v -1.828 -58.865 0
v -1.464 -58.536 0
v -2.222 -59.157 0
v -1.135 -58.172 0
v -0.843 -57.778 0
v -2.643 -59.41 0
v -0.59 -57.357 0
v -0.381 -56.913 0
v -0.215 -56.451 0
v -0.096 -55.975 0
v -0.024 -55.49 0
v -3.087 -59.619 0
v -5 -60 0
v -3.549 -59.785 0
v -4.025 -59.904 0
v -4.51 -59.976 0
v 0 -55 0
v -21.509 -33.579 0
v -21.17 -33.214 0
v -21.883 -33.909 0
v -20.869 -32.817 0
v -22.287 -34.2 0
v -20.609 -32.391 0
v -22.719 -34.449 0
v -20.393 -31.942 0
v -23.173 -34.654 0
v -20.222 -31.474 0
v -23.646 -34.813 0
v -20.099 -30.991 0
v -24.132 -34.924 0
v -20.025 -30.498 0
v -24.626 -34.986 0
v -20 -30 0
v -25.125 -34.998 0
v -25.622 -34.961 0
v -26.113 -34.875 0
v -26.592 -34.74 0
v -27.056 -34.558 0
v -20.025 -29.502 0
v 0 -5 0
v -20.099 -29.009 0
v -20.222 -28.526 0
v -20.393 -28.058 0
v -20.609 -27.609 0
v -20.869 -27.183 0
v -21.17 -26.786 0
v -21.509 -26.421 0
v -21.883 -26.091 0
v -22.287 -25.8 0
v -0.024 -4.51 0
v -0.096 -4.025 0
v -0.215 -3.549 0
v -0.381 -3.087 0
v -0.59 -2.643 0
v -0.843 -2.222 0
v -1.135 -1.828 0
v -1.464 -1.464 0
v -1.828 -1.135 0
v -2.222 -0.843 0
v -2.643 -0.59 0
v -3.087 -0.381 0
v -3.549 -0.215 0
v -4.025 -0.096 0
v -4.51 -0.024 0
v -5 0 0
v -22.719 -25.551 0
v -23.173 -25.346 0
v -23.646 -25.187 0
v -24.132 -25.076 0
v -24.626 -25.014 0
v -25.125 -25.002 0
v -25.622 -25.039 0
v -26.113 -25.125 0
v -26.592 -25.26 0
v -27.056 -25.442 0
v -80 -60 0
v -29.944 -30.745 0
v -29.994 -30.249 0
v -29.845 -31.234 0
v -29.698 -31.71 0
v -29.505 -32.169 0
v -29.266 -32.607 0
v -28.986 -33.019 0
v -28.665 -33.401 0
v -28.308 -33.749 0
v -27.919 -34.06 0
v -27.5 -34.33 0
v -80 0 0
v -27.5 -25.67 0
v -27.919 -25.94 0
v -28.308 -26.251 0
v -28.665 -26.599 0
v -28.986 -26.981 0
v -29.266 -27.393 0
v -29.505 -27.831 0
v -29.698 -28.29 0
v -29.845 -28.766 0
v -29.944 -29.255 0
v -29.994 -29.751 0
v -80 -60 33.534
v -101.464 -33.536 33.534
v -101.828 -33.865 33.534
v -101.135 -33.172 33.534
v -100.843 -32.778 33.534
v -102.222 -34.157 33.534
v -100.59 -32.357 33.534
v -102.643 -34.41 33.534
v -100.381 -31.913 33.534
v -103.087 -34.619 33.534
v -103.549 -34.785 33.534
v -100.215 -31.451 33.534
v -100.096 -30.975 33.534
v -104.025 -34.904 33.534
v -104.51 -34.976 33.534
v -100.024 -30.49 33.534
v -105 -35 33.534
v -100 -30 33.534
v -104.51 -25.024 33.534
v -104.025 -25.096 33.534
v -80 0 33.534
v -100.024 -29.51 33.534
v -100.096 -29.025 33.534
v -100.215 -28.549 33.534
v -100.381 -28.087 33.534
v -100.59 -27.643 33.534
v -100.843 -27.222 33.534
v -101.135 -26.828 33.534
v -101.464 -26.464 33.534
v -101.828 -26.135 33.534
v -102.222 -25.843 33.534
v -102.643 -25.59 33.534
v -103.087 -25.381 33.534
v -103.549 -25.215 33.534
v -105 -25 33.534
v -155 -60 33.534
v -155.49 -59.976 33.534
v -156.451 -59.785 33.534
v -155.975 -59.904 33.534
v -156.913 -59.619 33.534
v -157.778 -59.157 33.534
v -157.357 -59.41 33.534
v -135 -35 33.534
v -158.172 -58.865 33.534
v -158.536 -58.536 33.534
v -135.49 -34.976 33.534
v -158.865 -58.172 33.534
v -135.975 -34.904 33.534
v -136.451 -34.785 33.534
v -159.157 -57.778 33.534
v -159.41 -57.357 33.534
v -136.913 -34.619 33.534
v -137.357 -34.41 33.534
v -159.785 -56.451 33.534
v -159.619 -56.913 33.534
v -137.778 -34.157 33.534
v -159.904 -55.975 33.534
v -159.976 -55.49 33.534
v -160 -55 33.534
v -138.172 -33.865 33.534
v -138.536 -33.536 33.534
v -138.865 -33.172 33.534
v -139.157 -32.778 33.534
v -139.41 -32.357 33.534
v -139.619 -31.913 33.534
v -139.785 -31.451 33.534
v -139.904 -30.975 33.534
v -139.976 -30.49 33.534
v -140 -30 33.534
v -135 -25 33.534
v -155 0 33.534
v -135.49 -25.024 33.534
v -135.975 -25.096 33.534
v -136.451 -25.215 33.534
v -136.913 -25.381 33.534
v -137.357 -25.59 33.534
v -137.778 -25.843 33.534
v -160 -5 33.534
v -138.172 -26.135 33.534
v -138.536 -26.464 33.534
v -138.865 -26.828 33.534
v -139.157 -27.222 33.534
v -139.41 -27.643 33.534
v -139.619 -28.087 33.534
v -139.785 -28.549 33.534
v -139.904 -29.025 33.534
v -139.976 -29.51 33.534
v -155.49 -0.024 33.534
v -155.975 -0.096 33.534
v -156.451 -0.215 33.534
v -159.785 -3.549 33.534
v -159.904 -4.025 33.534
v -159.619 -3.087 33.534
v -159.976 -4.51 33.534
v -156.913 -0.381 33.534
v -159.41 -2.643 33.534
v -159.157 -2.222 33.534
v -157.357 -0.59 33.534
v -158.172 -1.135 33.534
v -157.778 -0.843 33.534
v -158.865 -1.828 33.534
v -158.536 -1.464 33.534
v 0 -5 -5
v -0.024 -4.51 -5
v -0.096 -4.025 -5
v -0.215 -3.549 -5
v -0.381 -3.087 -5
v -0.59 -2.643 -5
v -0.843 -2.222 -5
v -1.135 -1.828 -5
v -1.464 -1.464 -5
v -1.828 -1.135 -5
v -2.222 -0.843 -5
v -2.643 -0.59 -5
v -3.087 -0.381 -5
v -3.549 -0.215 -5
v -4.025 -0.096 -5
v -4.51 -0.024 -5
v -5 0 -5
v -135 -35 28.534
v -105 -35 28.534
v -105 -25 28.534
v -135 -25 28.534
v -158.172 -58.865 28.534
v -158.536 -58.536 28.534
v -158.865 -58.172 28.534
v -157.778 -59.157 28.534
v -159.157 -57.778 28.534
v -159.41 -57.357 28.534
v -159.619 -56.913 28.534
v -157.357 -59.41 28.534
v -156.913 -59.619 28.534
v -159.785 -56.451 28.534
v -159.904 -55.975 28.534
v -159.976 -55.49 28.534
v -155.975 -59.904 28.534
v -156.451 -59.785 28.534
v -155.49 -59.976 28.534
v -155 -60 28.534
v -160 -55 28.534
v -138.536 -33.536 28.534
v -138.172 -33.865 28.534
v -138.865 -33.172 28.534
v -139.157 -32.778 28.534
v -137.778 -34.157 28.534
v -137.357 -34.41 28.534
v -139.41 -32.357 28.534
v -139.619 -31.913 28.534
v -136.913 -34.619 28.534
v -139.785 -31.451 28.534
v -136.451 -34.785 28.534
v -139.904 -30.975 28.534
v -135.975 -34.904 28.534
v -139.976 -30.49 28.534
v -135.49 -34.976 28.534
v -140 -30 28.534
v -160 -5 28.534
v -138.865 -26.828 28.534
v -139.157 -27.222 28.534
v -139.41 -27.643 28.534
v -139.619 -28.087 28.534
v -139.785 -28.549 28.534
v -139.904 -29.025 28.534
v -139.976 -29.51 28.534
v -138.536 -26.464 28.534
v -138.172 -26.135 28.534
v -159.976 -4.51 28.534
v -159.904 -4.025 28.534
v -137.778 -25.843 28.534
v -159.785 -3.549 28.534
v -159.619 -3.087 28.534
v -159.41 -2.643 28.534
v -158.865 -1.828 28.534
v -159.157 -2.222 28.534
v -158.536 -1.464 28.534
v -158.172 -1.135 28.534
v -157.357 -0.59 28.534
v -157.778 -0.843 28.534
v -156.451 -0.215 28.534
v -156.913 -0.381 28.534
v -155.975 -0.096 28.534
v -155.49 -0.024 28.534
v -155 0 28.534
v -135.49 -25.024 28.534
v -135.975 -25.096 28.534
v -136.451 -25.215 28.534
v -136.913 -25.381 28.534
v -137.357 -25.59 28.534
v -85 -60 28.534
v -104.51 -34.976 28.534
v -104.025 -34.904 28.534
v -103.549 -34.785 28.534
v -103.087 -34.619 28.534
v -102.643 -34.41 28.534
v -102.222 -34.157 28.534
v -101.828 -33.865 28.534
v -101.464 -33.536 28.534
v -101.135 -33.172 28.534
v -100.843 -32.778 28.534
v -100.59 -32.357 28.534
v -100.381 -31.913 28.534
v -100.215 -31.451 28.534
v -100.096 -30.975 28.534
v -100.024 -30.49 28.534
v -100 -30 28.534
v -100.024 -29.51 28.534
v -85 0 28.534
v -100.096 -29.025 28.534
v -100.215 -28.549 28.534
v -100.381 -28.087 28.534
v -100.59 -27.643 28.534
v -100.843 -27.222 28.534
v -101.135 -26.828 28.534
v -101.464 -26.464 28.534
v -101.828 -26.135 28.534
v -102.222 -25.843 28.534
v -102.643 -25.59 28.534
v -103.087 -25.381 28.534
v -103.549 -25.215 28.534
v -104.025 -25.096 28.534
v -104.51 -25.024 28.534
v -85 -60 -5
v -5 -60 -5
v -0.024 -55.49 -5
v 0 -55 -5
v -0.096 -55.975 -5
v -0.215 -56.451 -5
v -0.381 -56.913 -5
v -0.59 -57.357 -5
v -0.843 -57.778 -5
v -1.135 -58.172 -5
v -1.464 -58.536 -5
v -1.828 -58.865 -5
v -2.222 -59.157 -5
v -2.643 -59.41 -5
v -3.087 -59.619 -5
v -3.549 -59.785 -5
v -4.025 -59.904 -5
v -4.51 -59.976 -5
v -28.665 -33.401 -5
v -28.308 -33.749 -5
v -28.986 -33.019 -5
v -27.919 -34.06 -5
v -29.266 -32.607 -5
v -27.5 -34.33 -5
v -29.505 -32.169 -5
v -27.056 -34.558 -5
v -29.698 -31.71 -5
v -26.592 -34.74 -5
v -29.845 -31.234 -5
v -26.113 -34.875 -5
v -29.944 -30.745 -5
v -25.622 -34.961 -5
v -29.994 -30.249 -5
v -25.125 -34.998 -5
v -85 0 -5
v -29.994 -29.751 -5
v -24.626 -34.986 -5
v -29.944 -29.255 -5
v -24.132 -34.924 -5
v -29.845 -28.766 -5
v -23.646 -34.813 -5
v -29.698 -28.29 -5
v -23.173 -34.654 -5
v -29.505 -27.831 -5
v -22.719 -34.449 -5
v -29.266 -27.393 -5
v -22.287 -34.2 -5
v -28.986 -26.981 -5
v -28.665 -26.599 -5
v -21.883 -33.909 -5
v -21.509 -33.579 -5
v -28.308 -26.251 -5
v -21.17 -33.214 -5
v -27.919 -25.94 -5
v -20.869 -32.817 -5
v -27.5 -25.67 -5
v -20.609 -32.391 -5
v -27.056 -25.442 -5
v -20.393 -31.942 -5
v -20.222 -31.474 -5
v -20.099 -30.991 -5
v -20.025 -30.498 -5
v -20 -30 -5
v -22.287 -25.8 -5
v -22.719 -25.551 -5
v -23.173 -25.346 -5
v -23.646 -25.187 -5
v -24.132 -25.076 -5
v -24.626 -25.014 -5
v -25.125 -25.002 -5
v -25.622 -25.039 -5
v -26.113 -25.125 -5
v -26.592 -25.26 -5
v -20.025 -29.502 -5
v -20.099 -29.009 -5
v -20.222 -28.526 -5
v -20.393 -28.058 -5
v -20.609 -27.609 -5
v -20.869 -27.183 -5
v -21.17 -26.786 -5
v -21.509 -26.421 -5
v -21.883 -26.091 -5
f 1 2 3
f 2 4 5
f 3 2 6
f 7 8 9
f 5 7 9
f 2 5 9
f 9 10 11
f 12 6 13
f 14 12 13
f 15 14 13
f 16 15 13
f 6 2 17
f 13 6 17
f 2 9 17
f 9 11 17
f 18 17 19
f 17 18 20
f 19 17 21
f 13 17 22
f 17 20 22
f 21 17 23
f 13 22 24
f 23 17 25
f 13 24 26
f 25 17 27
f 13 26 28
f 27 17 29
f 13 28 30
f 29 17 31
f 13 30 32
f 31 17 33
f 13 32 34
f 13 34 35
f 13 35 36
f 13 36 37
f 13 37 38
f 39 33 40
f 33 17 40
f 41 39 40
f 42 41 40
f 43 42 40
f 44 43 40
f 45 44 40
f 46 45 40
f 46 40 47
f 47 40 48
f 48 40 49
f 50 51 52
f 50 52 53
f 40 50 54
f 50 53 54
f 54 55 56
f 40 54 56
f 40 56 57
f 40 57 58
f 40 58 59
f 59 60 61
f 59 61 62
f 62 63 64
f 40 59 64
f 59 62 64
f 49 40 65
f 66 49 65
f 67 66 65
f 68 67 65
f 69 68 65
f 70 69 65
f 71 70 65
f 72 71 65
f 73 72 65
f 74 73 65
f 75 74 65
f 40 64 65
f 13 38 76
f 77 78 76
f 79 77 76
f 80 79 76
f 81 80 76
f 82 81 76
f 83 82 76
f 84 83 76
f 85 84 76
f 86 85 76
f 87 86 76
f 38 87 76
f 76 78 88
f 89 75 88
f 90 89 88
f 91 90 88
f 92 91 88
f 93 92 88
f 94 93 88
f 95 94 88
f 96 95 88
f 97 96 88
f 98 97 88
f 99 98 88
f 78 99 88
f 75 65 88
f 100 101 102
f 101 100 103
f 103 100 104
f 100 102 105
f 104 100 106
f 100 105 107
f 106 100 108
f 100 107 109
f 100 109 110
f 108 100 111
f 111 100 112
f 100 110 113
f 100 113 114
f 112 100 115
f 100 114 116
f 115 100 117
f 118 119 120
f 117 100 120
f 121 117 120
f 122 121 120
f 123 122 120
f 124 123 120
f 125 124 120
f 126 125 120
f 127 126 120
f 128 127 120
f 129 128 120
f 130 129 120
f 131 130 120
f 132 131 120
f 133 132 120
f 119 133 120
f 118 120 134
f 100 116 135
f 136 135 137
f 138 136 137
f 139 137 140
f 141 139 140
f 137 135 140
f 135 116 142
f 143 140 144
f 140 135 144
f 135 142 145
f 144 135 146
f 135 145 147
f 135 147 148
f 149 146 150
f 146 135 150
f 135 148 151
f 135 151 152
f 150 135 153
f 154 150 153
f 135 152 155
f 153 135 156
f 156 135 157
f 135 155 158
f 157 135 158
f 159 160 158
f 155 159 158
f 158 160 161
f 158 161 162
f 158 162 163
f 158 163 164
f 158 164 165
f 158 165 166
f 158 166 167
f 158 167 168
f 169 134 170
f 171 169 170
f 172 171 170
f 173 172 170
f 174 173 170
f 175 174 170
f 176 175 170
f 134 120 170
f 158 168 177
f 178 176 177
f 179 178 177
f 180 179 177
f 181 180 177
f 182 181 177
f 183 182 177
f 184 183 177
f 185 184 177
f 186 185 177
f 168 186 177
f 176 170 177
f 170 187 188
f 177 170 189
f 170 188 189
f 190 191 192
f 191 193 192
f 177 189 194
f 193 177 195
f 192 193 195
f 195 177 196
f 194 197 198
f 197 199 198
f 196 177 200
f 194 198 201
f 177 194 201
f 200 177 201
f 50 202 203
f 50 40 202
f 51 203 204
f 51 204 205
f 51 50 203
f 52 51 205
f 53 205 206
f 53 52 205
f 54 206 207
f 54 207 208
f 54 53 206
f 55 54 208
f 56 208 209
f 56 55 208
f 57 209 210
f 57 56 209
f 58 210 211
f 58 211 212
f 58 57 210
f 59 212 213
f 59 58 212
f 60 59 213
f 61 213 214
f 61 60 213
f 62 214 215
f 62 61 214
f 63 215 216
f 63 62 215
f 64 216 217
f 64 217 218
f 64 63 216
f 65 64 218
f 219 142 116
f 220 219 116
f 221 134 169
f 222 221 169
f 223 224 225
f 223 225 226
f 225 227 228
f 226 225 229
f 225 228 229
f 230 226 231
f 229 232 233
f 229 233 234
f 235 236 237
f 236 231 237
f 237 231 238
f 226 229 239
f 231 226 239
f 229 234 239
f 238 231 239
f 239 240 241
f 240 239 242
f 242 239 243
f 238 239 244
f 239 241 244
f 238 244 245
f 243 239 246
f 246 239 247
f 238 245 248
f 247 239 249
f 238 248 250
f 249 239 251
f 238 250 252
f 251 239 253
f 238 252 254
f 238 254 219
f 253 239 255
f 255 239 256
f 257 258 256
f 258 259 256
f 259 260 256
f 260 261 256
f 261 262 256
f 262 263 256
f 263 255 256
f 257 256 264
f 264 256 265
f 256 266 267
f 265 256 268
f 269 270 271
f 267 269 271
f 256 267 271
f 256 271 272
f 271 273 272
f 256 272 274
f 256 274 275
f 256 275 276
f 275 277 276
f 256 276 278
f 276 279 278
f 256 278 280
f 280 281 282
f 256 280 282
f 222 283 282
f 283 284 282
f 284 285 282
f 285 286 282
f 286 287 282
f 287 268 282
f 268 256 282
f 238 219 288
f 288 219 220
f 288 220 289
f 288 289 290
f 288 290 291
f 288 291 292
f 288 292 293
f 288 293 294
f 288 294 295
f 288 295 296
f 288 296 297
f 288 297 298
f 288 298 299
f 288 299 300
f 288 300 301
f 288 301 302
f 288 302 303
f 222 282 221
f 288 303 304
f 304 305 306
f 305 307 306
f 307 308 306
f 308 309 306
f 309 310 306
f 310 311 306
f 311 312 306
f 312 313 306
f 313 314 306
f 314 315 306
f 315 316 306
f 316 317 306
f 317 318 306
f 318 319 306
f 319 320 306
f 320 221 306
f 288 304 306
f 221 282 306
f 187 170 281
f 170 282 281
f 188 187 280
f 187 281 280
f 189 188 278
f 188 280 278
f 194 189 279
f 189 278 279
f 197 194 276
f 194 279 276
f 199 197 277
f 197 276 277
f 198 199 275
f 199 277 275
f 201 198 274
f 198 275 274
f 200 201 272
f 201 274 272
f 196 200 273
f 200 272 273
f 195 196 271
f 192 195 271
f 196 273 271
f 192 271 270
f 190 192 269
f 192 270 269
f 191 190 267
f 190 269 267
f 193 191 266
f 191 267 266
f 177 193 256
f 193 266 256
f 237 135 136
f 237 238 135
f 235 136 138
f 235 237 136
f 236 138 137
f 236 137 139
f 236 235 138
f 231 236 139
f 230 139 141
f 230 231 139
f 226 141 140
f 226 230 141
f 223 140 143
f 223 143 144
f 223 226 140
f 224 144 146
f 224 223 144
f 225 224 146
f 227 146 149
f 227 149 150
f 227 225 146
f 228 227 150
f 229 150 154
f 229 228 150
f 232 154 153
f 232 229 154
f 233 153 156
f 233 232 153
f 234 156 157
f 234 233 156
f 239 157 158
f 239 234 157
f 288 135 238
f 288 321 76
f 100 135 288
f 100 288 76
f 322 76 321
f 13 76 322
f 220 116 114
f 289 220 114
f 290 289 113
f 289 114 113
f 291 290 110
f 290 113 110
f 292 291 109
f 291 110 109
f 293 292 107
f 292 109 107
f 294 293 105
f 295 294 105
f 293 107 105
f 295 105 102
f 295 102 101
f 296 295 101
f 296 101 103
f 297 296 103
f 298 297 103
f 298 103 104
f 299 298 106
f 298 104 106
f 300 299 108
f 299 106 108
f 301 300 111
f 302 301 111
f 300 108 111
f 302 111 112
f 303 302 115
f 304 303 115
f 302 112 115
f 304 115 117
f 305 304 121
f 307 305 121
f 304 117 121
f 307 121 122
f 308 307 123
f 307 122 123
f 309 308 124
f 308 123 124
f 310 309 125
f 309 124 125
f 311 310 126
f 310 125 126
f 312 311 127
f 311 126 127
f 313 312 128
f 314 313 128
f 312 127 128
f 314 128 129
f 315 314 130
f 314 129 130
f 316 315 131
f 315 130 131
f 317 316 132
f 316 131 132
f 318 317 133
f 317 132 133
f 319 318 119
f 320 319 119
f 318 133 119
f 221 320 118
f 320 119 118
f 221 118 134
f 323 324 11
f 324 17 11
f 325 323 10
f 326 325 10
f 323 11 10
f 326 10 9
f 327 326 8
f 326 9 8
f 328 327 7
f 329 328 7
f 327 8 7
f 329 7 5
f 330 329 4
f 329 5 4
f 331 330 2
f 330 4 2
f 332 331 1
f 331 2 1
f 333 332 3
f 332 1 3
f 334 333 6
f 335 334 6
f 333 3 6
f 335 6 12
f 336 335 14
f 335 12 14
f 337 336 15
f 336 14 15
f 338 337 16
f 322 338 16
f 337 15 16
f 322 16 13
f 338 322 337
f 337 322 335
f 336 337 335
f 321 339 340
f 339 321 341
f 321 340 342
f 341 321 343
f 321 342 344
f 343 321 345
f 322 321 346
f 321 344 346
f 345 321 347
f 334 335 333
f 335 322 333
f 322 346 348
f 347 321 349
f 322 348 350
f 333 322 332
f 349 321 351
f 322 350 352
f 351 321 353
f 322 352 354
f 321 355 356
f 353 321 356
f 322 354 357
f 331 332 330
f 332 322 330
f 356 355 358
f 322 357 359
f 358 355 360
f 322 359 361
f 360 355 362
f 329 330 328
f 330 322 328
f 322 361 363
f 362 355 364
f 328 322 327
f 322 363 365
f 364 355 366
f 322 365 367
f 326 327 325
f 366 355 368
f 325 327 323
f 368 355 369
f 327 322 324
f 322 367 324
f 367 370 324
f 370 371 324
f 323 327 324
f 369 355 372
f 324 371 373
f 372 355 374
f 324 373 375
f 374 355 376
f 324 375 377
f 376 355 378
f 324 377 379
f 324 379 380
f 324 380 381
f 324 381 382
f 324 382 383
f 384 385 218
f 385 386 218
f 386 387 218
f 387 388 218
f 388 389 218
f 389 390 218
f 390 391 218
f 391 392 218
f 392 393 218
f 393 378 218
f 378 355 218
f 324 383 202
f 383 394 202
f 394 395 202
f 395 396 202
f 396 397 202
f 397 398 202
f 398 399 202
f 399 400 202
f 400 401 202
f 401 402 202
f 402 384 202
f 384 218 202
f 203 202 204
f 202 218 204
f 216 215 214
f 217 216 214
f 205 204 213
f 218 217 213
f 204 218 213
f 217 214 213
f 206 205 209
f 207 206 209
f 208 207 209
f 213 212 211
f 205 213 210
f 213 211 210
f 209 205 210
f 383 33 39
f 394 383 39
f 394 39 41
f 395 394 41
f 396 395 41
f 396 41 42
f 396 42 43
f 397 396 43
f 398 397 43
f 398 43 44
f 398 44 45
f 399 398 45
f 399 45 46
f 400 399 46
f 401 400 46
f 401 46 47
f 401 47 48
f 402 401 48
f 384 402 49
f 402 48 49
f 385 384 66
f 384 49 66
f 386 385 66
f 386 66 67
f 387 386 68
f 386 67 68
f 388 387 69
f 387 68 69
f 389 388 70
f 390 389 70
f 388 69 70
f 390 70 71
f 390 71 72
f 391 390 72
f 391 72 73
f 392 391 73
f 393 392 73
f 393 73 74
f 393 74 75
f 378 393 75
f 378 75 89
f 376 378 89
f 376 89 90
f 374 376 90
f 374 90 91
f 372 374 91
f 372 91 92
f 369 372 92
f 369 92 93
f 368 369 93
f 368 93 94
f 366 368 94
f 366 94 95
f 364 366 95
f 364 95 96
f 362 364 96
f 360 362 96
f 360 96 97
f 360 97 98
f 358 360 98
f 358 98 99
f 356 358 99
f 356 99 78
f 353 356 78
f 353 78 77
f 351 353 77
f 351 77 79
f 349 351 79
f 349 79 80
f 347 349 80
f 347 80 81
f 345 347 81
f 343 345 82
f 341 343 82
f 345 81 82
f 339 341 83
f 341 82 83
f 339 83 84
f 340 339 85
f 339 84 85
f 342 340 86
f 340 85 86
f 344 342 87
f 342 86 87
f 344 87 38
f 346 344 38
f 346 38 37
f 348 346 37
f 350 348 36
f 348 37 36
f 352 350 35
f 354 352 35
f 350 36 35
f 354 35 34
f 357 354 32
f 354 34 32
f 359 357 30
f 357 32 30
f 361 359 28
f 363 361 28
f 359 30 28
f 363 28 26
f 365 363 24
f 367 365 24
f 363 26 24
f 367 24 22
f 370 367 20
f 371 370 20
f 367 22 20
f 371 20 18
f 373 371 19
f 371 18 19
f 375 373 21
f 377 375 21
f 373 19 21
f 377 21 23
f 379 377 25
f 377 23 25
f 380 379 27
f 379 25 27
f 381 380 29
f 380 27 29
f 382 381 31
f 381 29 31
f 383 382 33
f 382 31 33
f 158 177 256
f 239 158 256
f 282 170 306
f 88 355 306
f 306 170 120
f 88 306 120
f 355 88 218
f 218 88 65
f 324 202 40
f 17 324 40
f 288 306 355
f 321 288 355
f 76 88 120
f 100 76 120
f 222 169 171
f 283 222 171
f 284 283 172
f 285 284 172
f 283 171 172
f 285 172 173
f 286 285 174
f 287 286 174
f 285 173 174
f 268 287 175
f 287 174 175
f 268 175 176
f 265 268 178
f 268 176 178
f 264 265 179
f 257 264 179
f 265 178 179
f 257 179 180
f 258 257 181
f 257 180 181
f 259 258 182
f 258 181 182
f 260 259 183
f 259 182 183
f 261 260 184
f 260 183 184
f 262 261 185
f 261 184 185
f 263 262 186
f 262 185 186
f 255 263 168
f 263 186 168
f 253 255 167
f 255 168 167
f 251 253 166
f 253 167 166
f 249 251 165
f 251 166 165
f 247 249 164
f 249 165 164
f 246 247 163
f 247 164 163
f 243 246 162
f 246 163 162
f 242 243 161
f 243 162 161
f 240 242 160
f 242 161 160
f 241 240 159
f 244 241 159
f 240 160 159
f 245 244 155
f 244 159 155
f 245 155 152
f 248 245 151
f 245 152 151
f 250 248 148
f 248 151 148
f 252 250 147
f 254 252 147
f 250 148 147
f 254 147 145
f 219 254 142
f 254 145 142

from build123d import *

# Parameters (mm, degrees)
F1_DEPTH = 60
F2_R     = 5
F3_DEPTH = 50
F4_R     = 5


with BuildPart() as f1:
    # F0 (on Front) → F1 (new body)
    with BuildSketch(Plane.XZ):
        Polygon((0, -5), (0, 0), (-80, 0), (-80, 33.534), (-160, 33.534), (-160, 28.534), (-85, 28.534), (-85, -5), align=None)
    extrude(amount=F1_DEPTH)

    # F2 (on face) → F3 (cut, symmetric)
    with BuildSketch(Plane.XY):
        with Locations((-25, -30)):
            Circle(F2_R)
        with BuildLine():
            Line((-105, -25), (-135, -25))
            ThreePointArc((-135, -25), (-140, -30), (-135, -35))
            Line((-135, -35), (-105, -35))
            ThreePointArc((-105, -35), (-100, -30), (-105, -25))
        make_face()
    extrude(amount=F3_DEPTH, both=True, mode=Mode.SUBTRACT)

    # F4
    f4_edges = [f1.edges().sort_by_distance(p)[0] for p in [
        (-160, -60, 31.034),
        (-160, 0, 31.034),
        (0, -60, -2.5),
        (0, 0, -2.5),
    ]]
    fillet(f4_edges, radius=F4_R)


solid = f1.part
